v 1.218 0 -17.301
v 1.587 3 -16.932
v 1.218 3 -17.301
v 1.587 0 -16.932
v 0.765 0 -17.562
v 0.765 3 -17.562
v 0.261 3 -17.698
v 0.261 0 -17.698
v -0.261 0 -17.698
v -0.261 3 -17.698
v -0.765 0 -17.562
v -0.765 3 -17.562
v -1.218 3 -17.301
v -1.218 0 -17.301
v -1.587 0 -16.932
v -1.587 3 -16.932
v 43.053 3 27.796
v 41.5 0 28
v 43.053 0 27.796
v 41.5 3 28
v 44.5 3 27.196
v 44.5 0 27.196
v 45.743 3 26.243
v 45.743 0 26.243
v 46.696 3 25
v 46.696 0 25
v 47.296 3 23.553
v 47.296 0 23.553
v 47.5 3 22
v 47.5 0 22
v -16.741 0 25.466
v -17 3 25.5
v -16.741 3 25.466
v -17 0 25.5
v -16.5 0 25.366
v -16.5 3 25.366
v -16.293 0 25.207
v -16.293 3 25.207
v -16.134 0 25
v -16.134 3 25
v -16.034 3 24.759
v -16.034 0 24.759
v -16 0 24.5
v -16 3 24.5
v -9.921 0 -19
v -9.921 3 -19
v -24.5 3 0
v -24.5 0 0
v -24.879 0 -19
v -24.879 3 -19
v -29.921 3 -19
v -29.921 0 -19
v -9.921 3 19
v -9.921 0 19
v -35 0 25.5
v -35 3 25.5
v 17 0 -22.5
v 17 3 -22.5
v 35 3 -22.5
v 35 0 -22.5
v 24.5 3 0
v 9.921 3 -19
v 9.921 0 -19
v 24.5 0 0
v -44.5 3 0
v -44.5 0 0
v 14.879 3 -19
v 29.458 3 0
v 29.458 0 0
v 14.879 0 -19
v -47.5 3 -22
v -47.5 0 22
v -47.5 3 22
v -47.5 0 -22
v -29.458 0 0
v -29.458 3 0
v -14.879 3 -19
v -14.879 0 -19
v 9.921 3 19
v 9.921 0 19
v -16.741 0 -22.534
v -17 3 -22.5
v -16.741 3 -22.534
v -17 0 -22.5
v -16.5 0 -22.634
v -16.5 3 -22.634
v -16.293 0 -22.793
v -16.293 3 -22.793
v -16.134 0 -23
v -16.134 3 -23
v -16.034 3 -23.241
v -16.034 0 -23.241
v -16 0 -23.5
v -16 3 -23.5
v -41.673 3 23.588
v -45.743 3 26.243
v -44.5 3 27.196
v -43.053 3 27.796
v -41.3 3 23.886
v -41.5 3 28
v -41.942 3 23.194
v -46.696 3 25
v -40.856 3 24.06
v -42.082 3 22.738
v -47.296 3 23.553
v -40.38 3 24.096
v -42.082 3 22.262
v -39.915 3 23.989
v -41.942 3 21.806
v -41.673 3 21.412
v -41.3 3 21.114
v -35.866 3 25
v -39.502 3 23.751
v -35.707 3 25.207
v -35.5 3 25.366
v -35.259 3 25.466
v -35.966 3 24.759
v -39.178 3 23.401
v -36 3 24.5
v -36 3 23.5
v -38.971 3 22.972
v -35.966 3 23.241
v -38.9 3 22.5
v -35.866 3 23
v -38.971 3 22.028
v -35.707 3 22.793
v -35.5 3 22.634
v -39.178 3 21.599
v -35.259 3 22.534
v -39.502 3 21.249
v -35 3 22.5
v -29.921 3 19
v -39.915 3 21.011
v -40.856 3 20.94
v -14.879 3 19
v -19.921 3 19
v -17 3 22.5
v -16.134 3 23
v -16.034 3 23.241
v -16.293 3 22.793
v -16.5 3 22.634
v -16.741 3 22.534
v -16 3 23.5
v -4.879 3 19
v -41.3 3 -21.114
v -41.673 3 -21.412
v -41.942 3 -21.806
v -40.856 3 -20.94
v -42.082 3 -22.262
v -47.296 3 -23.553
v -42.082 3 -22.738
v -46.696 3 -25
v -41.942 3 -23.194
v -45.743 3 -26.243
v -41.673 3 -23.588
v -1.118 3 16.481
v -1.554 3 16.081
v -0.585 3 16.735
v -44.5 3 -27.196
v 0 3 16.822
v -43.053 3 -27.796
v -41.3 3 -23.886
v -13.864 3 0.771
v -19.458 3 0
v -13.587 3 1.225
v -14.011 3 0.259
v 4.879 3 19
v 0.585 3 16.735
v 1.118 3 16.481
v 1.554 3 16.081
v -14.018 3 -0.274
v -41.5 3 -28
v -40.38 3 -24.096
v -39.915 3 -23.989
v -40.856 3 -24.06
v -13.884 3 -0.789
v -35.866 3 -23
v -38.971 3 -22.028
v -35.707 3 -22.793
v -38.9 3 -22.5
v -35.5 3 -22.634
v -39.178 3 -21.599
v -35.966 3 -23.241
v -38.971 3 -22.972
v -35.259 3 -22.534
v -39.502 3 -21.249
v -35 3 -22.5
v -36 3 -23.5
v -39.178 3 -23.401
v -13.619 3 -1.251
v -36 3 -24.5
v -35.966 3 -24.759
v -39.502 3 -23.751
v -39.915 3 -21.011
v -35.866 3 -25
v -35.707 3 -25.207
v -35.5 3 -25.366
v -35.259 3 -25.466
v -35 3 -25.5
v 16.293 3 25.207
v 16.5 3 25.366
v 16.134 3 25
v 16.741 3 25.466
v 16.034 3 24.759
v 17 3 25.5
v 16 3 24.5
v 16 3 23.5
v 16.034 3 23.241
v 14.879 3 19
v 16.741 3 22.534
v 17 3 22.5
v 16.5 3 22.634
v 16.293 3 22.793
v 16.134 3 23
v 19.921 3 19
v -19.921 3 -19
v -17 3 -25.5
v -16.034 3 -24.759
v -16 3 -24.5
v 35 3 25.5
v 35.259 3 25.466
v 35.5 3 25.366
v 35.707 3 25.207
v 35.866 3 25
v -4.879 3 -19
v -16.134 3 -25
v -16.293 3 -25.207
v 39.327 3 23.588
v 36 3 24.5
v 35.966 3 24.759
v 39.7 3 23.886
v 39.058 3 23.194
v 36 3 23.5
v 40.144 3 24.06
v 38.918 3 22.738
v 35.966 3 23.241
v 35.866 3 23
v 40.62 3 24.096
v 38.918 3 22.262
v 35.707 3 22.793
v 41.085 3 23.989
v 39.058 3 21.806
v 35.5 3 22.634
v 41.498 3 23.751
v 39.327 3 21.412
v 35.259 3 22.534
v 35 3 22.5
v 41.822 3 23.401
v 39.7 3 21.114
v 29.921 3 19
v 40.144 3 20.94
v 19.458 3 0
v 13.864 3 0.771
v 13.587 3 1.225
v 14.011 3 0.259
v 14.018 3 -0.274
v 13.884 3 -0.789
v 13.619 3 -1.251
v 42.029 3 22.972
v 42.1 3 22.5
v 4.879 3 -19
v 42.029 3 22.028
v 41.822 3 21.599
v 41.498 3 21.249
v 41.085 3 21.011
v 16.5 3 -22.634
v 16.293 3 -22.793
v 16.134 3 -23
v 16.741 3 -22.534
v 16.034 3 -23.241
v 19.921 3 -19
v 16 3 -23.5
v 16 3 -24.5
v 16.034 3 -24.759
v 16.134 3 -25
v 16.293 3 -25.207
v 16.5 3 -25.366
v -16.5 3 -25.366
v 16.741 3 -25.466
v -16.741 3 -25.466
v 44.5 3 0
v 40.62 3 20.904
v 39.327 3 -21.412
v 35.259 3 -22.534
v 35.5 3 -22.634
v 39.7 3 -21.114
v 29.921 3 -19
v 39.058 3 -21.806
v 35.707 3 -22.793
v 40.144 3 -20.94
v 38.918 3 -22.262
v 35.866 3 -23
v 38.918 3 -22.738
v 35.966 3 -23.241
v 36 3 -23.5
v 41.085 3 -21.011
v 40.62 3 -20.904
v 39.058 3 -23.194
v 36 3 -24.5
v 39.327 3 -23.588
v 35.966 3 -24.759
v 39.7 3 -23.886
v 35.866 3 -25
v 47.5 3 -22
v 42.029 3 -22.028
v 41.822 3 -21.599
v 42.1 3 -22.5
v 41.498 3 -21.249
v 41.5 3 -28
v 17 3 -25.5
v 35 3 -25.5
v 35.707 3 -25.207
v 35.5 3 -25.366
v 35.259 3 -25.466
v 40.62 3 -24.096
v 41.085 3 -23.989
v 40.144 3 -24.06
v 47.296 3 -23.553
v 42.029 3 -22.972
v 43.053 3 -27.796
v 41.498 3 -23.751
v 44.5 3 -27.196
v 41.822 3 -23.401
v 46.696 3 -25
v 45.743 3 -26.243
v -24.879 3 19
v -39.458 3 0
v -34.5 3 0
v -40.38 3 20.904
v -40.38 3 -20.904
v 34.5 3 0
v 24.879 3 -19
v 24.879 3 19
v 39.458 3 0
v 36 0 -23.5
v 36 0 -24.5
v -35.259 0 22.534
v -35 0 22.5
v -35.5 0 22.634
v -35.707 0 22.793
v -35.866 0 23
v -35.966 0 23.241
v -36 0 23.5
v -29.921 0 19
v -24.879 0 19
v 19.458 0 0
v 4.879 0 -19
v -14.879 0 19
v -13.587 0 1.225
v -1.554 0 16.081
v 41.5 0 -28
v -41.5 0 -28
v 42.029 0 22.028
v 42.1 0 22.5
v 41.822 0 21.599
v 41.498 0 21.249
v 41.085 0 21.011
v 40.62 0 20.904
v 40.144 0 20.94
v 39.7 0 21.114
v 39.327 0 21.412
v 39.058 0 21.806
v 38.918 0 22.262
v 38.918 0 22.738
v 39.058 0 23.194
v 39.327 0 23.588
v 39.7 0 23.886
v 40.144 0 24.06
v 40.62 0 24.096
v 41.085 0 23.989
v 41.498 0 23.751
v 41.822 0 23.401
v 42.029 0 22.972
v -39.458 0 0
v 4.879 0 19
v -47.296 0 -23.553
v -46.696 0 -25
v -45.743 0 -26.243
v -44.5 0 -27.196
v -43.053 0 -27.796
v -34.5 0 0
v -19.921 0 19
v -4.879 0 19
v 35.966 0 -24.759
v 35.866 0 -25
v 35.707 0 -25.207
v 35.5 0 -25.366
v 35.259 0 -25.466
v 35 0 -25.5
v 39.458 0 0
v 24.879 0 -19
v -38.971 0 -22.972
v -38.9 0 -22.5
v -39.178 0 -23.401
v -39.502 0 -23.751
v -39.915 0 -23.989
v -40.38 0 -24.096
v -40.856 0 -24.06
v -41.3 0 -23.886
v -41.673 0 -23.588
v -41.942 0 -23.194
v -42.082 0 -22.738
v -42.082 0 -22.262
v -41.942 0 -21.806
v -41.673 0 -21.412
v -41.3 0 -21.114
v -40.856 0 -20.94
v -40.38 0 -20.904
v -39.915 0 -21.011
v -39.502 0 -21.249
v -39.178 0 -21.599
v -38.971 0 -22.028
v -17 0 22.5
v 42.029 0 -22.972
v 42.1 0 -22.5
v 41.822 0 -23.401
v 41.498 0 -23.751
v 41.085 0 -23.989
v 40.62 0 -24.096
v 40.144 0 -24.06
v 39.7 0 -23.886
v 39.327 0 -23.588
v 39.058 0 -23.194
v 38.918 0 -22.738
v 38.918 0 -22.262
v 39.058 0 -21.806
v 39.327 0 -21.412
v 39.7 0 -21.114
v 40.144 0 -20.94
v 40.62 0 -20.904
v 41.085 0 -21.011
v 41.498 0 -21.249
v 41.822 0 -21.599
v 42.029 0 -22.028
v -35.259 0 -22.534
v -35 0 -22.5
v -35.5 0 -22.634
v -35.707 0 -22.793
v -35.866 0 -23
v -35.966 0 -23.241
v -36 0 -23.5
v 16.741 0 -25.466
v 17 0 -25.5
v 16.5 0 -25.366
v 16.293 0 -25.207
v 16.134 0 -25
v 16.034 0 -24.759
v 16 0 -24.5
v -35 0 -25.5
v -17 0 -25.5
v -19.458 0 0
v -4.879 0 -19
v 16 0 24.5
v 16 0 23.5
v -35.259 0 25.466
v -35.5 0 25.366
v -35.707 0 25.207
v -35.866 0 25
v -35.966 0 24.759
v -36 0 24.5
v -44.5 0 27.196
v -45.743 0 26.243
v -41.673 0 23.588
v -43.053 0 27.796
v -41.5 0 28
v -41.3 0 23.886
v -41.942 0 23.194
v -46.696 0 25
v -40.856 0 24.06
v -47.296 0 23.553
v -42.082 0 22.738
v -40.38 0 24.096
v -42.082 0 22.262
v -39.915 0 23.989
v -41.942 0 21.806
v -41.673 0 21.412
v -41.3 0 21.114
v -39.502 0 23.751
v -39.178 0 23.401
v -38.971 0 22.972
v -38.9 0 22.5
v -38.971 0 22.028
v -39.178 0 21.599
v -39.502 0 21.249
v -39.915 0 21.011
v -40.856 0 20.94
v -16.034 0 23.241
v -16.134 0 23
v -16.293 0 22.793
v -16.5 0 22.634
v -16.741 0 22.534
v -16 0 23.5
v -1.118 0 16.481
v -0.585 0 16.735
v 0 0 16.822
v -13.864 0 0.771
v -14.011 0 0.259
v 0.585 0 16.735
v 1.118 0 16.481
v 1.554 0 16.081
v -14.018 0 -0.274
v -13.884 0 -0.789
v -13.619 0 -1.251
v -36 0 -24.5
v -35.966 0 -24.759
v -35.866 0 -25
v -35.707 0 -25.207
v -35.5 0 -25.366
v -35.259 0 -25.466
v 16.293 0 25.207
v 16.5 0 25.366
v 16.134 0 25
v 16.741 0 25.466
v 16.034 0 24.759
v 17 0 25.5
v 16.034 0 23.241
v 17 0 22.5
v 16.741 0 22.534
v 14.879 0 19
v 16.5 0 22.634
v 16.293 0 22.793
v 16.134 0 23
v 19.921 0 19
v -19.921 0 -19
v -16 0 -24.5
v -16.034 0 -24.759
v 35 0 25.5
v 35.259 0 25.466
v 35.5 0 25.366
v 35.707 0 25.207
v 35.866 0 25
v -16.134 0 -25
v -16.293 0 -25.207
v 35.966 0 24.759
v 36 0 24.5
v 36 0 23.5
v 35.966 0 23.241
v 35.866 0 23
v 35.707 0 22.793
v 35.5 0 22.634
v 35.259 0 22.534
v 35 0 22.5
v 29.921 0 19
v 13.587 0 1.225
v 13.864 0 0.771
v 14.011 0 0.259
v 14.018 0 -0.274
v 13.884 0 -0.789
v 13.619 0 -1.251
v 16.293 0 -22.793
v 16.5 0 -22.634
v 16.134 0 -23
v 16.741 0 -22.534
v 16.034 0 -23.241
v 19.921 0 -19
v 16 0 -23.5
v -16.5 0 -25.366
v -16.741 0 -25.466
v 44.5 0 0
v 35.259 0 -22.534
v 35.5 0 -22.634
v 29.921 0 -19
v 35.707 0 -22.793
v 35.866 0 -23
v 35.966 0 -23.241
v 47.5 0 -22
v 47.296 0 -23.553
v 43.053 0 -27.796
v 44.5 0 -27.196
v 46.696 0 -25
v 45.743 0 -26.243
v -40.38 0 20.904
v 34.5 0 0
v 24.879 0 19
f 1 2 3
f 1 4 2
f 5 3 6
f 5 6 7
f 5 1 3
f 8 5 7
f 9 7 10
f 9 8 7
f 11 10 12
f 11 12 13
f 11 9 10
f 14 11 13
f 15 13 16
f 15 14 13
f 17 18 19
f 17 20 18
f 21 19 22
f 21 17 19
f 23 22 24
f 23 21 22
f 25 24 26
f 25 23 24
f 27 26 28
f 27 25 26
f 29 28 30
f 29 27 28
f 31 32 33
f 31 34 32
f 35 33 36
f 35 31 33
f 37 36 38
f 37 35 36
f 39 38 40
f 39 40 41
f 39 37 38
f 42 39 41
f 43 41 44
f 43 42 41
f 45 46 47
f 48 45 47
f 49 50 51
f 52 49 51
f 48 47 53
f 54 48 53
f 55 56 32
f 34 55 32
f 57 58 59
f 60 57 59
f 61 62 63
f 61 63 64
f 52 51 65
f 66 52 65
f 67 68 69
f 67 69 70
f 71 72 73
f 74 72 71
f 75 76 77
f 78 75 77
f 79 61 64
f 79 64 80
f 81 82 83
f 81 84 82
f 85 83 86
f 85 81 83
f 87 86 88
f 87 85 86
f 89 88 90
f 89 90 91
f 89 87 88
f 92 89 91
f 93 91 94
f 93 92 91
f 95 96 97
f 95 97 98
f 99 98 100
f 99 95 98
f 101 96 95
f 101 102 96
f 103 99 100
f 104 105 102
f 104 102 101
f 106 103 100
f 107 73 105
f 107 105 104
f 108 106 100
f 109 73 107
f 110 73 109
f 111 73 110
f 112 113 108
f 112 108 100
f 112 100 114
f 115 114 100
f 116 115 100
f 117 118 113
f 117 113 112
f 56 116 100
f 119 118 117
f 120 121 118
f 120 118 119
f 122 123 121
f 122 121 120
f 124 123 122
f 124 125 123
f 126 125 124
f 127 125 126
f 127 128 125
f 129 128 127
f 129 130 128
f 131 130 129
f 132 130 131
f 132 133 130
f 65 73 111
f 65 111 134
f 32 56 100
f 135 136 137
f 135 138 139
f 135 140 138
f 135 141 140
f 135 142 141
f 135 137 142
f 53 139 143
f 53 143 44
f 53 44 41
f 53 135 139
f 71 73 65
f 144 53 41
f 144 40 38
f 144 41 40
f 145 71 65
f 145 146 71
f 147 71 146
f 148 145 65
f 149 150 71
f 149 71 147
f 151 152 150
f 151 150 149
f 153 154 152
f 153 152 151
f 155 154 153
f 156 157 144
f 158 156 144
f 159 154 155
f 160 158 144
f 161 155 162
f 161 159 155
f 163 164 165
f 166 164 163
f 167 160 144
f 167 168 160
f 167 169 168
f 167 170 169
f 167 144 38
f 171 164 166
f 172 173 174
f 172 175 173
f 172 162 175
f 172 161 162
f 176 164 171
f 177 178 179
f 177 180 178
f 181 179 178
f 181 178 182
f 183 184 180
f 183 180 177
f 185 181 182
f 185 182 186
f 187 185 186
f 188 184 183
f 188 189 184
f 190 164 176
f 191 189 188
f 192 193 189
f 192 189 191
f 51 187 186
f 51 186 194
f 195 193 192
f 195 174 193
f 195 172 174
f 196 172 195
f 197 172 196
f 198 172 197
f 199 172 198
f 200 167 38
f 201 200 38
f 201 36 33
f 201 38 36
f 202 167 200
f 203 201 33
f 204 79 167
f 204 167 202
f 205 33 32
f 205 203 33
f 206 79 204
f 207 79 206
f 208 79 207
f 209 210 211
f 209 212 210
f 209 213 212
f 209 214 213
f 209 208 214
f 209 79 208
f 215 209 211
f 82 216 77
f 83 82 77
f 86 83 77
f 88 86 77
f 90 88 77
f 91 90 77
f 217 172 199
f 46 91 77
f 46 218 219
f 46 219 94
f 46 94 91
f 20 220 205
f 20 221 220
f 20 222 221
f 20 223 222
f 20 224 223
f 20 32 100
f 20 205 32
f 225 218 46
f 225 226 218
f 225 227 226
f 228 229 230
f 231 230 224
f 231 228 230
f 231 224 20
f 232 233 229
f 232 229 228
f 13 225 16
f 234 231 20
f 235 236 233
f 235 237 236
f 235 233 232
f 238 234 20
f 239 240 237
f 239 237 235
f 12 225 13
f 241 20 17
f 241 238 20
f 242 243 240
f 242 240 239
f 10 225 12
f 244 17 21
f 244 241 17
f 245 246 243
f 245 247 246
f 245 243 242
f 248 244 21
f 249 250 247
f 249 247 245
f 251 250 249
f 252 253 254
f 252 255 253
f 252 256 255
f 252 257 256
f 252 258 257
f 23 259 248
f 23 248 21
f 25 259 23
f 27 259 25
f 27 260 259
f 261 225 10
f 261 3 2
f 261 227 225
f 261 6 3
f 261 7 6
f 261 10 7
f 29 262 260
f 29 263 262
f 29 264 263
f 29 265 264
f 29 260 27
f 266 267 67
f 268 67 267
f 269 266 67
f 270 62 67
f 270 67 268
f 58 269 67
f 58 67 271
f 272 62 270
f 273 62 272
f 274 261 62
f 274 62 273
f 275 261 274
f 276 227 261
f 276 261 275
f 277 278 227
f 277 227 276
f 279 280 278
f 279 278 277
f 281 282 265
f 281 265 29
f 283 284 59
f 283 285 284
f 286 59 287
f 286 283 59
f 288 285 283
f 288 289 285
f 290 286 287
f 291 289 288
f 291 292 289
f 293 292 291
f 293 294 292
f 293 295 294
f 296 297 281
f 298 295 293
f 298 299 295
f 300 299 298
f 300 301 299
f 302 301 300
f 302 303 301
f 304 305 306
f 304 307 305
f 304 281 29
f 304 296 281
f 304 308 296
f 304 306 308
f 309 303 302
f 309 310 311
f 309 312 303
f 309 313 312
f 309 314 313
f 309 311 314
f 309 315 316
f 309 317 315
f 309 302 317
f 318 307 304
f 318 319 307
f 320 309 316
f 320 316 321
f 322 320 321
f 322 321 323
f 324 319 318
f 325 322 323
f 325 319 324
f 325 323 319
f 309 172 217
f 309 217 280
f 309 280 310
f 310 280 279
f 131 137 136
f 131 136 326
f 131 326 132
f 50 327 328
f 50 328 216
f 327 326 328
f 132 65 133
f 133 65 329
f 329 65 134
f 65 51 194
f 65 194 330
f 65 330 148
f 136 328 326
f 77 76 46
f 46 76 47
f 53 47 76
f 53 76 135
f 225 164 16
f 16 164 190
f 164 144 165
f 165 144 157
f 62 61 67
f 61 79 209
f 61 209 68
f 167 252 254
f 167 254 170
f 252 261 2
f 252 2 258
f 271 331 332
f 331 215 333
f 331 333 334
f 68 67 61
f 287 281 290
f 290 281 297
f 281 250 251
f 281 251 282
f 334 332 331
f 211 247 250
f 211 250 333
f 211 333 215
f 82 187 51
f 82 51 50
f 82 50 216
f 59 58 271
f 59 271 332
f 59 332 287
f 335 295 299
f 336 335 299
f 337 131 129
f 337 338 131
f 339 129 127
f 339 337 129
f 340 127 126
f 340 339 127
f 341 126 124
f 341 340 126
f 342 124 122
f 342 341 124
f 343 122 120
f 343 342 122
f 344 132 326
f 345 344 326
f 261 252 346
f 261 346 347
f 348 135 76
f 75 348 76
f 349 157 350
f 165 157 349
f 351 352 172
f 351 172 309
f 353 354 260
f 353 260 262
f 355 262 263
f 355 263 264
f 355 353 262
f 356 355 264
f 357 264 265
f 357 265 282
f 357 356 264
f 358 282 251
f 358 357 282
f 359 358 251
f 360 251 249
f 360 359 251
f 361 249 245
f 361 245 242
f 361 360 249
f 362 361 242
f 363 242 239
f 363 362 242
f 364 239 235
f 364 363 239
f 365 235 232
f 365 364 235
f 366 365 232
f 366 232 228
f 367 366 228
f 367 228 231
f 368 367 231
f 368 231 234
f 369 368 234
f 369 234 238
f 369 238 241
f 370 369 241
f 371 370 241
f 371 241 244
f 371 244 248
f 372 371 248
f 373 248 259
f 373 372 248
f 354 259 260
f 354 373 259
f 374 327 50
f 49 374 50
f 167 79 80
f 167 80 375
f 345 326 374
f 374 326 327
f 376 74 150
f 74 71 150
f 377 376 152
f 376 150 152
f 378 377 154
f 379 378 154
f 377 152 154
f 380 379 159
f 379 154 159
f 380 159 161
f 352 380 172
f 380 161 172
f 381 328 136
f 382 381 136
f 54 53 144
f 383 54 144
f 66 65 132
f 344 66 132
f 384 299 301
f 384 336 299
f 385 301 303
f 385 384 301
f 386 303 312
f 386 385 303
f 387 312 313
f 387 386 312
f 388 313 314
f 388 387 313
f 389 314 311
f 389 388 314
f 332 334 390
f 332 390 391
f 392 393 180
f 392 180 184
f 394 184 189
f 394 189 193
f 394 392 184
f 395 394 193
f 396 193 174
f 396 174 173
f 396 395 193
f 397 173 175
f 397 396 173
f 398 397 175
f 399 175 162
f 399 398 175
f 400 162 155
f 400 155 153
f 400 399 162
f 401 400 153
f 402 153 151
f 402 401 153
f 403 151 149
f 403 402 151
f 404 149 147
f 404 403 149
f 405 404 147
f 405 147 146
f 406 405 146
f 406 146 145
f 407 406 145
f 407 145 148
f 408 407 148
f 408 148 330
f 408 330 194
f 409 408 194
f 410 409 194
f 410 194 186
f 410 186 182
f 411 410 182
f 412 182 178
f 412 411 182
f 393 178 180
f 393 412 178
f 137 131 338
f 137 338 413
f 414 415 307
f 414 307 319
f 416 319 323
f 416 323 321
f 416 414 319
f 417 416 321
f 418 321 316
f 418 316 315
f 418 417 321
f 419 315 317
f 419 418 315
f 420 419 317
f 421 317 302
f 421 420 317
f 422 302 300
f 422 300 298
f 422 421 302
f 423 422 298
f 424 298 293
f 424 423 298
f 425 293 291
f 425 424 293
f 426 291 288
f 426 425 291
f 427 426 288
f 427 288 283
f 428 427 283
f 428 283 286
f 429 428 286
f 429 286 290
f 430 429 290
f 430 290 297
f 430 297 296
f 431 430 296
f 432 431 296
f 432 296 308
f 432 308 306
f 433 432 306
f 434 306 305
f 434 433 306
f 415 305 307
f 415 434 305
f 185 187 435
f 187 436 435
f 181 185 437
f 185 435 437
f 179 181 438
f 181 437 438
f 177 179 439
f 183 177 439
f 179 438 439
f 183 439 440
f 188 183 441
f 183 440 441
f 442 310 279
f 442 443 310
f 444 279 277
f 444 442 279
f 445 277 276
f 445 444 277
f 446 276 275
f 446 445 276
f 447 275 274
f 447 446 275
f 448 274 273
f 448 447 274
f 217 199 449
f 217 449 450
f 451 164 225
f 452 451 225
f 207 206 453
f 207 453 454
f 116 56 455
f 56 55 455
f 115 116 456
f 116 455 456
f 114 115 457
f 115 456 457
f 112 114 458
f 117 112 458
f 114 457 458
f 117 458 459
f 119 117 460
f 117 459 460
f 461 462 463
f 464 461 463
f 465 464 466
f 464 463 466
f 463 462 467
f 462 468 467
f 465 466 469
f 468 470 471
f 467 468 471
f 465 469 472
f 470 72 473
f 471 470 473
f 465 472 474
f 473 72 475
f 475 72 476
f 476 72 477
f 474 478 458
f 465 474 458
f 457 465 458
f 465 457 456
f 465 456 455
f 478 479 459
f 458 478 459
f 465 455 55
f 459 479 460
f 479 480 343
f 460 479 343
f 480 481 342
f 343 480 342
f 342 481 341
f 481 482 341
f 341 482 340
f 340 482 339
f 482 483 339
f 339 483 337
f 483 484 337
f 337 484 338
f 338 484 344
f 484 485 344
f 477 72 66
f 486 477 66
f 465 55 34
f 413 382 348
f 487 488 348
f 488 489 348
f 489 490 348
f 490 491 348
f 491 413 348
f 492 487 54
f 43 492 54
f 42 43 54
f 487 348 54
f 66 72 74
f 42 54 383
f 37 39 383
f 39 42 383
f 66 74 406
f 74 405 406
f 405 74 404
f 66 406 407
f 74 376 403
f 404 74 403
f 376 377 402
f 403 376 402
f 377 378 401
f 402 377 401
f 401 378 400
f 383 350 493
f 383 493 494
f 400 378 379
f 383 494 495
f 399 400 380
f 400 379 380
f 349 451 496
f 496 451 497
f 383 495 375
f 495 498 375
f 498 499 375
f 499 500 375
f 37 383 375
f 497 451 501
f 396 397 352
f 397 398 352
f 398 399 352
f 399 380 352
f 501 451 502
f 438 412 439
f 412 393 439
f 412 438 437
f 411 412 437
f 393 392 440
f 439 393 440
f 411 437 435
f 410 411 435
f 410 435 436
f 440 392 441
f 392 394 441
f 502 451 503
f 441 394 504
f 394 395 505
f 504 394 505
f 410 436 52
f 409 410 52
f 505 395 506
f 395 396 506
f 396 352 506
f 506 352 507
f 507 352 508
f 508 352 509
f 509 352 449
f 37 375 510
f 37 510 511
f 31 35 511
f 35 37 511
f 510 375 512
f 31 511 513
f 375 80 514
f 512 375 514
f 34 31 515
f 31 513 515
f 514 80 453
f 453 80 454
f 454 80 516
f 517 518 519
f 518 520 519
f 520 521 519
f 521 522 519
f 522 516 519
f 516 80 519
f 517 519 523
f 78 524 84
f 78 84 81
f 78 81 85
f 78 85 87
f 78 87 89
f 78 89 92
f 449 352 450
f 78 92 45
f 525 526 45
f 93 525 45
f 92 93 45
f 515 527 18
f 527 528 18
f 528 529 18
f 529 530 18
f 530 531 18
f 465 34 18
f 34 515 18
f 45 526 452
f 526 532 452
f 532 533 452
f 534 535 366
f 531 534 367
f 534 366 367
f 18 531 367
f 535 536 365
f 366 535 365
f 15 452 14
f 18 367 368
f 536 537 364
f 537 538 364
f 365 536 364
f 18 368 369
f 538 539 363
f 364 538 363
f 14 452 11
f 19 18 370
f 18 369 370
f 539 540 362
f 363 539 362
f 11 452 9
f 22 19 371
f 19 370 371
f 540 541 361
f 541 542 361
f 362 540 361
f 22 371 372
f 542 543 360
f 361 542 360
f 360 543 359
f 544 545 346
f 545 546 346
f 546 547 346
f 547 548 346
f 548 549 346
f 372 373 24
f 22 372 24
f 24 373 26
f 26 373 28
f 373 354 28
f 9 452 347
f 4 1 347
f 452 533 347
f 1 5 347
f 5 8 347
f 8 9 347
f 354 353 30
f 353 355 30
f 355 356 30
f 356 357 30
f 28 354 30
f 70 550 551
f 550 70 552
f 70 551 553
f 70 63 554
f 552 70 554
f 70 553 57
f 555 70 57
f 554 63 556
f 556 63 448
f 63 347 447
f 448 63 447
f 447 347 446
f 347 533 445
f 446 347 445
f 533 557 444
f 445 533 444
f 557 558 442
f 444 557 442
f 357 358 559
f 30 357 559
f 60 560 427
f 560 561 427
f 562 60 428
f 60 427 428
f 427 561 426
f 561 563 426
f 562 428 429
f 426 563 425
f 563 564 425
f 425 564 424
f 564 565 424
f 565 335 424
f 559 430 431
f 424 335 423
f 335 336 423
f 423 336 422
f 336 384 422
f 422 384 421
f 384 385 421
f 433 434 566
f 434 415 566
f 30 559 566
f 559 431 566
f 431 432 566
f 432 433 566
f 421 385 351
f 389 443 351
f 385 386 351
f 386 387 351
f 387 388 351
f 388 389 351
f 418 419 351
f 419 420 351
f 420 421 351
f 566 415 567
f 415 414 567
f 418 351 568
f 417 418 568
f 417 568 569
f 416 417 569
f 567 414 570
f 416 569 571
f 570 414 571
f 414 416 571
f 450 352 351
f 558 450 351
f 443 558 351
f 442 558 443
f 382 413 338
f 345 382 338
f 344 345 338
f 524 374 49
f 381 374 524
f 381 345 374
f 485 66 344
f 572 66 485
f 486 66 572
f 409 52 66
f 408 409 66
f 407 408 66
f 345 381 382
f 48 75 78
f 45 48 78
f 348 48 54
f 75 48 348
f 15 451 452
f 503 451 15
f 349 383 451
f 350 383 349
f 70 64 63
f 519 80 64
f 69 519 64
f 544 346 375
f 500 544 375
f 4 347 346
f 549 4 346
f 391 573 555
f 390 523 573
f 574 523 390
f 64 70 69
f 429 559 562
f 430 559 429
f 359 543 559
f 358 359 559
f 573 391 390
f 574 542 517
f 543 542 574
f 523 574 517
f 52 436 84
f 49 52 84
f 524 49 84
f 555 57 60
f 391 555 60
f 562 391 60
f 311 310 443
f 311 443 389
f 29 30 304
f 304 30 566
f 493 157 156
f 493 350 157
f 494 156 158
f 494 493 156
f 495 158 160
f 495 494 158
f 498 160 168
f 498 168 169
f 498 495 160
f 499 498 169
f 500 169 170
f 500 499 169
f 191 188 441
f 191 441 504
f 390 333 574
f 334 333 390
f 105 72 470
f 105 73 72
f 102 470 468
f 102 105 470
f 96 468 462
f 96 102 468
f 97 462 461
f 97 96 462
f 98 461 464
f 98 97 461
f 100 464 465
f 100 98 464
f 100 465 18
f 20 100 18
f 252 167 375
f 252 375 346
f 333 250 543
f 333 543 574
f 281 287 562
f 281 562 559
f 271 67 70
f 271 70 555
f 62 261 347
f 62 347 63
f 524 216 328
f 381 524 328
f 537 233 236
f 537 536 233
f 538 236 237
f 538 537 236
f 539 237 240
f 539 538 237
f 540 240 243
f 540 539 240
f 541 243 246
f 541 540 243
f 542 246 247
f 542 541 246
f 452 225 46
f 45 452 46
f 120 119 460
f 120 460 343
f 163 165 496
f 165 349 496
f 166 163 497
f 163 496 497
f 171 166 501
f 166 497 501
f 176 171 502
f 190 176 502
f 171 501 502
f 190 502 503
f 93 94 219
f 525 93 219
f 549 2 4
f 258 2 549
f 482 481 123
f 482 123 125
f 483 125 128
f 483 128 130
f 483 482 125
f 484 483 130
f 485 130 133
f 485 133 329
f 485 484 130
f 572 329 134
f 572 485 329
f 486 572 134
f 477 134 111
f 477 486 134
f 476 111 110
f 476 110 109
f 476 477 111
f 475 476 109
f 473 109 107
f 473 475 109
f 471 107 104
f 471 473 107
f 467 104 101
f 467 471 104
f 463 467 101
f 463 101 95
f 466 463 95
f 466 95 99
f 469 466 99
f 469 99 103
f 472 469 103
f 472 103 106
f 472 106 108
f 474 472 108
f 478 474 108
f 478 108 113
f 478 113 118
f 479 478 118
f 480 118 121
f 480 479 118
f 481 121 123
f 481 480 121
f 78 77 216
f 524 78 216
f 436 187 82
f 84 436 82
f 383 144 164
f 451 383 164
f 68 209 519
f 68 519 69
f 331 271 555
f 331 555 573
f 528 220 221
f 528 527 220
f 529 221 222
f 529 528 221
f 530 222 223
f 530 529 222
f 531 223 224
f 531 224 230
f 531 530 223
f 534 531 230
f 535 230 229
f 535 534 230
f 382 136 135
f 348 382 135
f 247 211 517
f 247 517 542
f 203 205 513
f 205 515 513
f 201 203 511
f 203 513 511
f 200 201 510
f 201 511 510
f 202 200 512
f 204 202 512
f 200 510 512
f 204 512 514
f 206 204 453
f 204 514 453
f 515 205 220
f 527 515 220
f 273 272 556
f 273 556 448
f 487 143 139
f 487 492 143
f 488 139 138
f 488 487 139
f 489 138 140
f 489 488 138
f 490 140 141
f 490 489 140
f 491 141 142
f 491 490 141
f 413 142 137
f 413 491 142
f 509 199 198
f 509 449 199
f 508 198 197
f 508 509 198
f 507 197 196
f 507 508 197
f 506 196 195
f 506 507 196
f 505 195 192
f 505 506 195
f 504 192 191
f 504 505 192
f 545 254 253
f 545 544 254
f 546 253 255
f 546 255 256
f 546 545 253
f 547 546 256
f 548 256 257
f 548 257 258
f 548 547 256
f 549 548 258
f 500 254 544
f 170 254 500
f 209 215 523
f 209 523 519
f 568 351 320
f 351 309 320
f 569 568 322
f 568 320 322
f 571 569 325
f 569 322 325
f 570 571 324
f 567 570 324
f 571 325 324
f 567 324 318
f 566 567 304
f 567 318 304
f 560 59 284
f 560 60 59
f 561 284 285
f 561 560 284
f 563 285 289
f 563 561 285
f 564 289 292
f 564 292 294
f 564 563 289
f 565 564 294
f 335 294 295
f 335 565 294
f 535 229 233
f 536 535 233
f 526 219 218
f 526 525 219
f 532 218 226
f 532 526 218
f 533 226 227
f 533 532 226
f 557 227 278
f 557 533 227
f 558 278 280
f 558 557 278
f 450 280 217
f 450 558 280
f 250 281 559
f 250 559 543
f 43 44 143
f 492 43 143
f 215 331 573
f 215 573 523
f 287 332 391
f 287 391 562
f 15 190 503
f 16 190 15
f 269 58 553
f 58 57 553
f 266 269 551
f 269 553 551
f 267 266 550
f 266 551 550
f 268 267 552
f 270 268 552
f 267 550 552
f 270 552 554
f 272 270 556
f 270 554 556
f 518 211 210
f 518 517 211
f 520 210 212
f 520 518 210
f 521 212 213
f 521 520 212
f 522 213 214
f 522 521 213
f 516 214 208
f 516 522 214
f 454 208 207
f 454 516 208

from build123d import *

# Parameters (mm, degrees)
SKETCH_1_W          = 95
SKETCH_1_H          = 56
SKETCH_1_R          = 1.6
EXTRUDE_1_DEPTH     = 3
FILLET_1_R          = 6
SKETCH_2_W          = 20
SKETCH_2_H          = 3
CUT_EXTRUDE_1_DEPTH = 4
FILLET_2_R          = 2
FILLET_3_R          = 1


with BuildPart() as part:
    # 草图1 → 凸台-拉伸1 (new body)
    with BuildSketch(Plane(origin=(0, 0, 0), x_dir=(1, 0, 0), z_dir=(0, 1, 0))):
        Rectangle(SKETCH_1_W, SKETCH_1_H)
        with Locations((-40.5, 22.5)):
            Circle(SKETCH_1_R, mode=Mode.SUBTRACT)
        with Locations((-40.5, -22.5)):
            Circle(SKETCH_1_R, mode=Mode.SUBTRACT)
        with Locations((40.5, -22.5)):
            Circle(SKETCH_1_R, mode=Mode.SUBTRACT)
        with Locations((40.5, 22.5)):
            Circle(SKETCH_1_R, mode=Mode.SUBTRACT)
    extrude(amount=EXTRUDE_1_DEPTH)

    # 圆角1
    fillet_1_edges = [part.edges().sort_by_distance(p)[0] for p in [
        (47.5, 1.5, 28),
        (-47.5, 1.5, 28),
        (-47.5, 1.5, -28),
        (47.5, 1.5, -28),
    ]]
    fillet(fillet_1_edges, radius=FILLET_1_R)

    # 草图2 → 切除-拉伸1 (cut, through all)
    with BuildSketch(Plane(origin=(0, 3, 0), x_dir=(1, 0, 0), z_dir=(0, 1, 0))):
        with Locations((26, 24)):
            Rectangle(SKETCH_2_W, SKETCH_2_H)
        with Locations((-26, 24)):
            Rectangle(SKETCH_2_W, SKETCH_2_H)
        with Locations((-26, -24)):
            Rectangle(SKETCH_2_W, SKETCH_2_H)
        with Locations((26, -24)):
            Rectangle(SKETCH_2_W, SKETCH_2_H)
        Polygon((-39.458110344, 0), (-24.878897572, 19), (-29.920787228, 19), (-44.5, 0), (-29.920787228, -19), (-24.878897572, -19), align=None)
        Polygon((-19.920787228, -19), (-14.878897572, -19), (-29.458110344, 0), (-14.878897572, 19), (-19.920787228, 19), (-34.5, 0), align=None)
        Polygon((-9.920787228, -19), (-4.878897572, -19), (-19.458110344, 0), (-4.878897572, 19), (-9.920787228, 19), (-24.5, 0), align=None)
        Polygon((44.5, 0), (29.920787228, -19), (24.878897572, -19), (39.458110344, 0), (24.878897572, 19), (29.920787228, 19), align=None)
        Polygon((34.5, 0), (19.920787228, -19), (14.878897572, -19), (29.458110344, 0), (14.878897572, 19), (19.920787228, 19), align=None)
        Polygon((24.5, 0), (9.920787228, -19), (4.878897572, -19), (19.458110344, 0), (4.878897572, 19), (9.920787228, 19), align=None)
        Polygon((-14.579212772, 0), (0, 19), (14.579212772, 0), (0, -18), align=None)
    extrude(amount=-CUT_EXTRUDE_1_DEPTH, mode=Mode.SUBTRACT)

    # 圆角2
    fillet_2_edges = [part.edges().sort_by_distance(p)[0] for p in [
        (0, 1.5, 18),
        (-14.579212772, 1.5, 0),
        (0, 1.5, -19),
        (14.579212772, 1.5, 0),
    ]]
    fillet(fillet_2_edges, radius=FILLET_2_R)

    # 圆角3
    fillet_3_edges = [part.edges().sort_by_distance(p)[0] for p in [
        (36, 1.5, -25.5),
        (36, 1.5, -22.5),
        (16, 1.5, -22.5),
        (16, 1.5, -25.5),
        (-36, 1.5, 25.5),
        (-36, 1.5, 22.5),
        (-16, 1.5, 22.5),
        (-16, 1.5, 25.5),
        (16, 1.5, 22.5),
        (36, 1.5, 22.5),
        (36, 1.5, 25.5),
        (16, 1.5, 25.5),
        (-16, 1.5, -25.5),
        (-16, 1.5, -22.5),
        (-36, 1.5, -22.5),
        (-36, 1.5, -25.5),
    ]]
    fillet(fillet_3_edges, radius=FILLET_3_R)


solid = part.part
